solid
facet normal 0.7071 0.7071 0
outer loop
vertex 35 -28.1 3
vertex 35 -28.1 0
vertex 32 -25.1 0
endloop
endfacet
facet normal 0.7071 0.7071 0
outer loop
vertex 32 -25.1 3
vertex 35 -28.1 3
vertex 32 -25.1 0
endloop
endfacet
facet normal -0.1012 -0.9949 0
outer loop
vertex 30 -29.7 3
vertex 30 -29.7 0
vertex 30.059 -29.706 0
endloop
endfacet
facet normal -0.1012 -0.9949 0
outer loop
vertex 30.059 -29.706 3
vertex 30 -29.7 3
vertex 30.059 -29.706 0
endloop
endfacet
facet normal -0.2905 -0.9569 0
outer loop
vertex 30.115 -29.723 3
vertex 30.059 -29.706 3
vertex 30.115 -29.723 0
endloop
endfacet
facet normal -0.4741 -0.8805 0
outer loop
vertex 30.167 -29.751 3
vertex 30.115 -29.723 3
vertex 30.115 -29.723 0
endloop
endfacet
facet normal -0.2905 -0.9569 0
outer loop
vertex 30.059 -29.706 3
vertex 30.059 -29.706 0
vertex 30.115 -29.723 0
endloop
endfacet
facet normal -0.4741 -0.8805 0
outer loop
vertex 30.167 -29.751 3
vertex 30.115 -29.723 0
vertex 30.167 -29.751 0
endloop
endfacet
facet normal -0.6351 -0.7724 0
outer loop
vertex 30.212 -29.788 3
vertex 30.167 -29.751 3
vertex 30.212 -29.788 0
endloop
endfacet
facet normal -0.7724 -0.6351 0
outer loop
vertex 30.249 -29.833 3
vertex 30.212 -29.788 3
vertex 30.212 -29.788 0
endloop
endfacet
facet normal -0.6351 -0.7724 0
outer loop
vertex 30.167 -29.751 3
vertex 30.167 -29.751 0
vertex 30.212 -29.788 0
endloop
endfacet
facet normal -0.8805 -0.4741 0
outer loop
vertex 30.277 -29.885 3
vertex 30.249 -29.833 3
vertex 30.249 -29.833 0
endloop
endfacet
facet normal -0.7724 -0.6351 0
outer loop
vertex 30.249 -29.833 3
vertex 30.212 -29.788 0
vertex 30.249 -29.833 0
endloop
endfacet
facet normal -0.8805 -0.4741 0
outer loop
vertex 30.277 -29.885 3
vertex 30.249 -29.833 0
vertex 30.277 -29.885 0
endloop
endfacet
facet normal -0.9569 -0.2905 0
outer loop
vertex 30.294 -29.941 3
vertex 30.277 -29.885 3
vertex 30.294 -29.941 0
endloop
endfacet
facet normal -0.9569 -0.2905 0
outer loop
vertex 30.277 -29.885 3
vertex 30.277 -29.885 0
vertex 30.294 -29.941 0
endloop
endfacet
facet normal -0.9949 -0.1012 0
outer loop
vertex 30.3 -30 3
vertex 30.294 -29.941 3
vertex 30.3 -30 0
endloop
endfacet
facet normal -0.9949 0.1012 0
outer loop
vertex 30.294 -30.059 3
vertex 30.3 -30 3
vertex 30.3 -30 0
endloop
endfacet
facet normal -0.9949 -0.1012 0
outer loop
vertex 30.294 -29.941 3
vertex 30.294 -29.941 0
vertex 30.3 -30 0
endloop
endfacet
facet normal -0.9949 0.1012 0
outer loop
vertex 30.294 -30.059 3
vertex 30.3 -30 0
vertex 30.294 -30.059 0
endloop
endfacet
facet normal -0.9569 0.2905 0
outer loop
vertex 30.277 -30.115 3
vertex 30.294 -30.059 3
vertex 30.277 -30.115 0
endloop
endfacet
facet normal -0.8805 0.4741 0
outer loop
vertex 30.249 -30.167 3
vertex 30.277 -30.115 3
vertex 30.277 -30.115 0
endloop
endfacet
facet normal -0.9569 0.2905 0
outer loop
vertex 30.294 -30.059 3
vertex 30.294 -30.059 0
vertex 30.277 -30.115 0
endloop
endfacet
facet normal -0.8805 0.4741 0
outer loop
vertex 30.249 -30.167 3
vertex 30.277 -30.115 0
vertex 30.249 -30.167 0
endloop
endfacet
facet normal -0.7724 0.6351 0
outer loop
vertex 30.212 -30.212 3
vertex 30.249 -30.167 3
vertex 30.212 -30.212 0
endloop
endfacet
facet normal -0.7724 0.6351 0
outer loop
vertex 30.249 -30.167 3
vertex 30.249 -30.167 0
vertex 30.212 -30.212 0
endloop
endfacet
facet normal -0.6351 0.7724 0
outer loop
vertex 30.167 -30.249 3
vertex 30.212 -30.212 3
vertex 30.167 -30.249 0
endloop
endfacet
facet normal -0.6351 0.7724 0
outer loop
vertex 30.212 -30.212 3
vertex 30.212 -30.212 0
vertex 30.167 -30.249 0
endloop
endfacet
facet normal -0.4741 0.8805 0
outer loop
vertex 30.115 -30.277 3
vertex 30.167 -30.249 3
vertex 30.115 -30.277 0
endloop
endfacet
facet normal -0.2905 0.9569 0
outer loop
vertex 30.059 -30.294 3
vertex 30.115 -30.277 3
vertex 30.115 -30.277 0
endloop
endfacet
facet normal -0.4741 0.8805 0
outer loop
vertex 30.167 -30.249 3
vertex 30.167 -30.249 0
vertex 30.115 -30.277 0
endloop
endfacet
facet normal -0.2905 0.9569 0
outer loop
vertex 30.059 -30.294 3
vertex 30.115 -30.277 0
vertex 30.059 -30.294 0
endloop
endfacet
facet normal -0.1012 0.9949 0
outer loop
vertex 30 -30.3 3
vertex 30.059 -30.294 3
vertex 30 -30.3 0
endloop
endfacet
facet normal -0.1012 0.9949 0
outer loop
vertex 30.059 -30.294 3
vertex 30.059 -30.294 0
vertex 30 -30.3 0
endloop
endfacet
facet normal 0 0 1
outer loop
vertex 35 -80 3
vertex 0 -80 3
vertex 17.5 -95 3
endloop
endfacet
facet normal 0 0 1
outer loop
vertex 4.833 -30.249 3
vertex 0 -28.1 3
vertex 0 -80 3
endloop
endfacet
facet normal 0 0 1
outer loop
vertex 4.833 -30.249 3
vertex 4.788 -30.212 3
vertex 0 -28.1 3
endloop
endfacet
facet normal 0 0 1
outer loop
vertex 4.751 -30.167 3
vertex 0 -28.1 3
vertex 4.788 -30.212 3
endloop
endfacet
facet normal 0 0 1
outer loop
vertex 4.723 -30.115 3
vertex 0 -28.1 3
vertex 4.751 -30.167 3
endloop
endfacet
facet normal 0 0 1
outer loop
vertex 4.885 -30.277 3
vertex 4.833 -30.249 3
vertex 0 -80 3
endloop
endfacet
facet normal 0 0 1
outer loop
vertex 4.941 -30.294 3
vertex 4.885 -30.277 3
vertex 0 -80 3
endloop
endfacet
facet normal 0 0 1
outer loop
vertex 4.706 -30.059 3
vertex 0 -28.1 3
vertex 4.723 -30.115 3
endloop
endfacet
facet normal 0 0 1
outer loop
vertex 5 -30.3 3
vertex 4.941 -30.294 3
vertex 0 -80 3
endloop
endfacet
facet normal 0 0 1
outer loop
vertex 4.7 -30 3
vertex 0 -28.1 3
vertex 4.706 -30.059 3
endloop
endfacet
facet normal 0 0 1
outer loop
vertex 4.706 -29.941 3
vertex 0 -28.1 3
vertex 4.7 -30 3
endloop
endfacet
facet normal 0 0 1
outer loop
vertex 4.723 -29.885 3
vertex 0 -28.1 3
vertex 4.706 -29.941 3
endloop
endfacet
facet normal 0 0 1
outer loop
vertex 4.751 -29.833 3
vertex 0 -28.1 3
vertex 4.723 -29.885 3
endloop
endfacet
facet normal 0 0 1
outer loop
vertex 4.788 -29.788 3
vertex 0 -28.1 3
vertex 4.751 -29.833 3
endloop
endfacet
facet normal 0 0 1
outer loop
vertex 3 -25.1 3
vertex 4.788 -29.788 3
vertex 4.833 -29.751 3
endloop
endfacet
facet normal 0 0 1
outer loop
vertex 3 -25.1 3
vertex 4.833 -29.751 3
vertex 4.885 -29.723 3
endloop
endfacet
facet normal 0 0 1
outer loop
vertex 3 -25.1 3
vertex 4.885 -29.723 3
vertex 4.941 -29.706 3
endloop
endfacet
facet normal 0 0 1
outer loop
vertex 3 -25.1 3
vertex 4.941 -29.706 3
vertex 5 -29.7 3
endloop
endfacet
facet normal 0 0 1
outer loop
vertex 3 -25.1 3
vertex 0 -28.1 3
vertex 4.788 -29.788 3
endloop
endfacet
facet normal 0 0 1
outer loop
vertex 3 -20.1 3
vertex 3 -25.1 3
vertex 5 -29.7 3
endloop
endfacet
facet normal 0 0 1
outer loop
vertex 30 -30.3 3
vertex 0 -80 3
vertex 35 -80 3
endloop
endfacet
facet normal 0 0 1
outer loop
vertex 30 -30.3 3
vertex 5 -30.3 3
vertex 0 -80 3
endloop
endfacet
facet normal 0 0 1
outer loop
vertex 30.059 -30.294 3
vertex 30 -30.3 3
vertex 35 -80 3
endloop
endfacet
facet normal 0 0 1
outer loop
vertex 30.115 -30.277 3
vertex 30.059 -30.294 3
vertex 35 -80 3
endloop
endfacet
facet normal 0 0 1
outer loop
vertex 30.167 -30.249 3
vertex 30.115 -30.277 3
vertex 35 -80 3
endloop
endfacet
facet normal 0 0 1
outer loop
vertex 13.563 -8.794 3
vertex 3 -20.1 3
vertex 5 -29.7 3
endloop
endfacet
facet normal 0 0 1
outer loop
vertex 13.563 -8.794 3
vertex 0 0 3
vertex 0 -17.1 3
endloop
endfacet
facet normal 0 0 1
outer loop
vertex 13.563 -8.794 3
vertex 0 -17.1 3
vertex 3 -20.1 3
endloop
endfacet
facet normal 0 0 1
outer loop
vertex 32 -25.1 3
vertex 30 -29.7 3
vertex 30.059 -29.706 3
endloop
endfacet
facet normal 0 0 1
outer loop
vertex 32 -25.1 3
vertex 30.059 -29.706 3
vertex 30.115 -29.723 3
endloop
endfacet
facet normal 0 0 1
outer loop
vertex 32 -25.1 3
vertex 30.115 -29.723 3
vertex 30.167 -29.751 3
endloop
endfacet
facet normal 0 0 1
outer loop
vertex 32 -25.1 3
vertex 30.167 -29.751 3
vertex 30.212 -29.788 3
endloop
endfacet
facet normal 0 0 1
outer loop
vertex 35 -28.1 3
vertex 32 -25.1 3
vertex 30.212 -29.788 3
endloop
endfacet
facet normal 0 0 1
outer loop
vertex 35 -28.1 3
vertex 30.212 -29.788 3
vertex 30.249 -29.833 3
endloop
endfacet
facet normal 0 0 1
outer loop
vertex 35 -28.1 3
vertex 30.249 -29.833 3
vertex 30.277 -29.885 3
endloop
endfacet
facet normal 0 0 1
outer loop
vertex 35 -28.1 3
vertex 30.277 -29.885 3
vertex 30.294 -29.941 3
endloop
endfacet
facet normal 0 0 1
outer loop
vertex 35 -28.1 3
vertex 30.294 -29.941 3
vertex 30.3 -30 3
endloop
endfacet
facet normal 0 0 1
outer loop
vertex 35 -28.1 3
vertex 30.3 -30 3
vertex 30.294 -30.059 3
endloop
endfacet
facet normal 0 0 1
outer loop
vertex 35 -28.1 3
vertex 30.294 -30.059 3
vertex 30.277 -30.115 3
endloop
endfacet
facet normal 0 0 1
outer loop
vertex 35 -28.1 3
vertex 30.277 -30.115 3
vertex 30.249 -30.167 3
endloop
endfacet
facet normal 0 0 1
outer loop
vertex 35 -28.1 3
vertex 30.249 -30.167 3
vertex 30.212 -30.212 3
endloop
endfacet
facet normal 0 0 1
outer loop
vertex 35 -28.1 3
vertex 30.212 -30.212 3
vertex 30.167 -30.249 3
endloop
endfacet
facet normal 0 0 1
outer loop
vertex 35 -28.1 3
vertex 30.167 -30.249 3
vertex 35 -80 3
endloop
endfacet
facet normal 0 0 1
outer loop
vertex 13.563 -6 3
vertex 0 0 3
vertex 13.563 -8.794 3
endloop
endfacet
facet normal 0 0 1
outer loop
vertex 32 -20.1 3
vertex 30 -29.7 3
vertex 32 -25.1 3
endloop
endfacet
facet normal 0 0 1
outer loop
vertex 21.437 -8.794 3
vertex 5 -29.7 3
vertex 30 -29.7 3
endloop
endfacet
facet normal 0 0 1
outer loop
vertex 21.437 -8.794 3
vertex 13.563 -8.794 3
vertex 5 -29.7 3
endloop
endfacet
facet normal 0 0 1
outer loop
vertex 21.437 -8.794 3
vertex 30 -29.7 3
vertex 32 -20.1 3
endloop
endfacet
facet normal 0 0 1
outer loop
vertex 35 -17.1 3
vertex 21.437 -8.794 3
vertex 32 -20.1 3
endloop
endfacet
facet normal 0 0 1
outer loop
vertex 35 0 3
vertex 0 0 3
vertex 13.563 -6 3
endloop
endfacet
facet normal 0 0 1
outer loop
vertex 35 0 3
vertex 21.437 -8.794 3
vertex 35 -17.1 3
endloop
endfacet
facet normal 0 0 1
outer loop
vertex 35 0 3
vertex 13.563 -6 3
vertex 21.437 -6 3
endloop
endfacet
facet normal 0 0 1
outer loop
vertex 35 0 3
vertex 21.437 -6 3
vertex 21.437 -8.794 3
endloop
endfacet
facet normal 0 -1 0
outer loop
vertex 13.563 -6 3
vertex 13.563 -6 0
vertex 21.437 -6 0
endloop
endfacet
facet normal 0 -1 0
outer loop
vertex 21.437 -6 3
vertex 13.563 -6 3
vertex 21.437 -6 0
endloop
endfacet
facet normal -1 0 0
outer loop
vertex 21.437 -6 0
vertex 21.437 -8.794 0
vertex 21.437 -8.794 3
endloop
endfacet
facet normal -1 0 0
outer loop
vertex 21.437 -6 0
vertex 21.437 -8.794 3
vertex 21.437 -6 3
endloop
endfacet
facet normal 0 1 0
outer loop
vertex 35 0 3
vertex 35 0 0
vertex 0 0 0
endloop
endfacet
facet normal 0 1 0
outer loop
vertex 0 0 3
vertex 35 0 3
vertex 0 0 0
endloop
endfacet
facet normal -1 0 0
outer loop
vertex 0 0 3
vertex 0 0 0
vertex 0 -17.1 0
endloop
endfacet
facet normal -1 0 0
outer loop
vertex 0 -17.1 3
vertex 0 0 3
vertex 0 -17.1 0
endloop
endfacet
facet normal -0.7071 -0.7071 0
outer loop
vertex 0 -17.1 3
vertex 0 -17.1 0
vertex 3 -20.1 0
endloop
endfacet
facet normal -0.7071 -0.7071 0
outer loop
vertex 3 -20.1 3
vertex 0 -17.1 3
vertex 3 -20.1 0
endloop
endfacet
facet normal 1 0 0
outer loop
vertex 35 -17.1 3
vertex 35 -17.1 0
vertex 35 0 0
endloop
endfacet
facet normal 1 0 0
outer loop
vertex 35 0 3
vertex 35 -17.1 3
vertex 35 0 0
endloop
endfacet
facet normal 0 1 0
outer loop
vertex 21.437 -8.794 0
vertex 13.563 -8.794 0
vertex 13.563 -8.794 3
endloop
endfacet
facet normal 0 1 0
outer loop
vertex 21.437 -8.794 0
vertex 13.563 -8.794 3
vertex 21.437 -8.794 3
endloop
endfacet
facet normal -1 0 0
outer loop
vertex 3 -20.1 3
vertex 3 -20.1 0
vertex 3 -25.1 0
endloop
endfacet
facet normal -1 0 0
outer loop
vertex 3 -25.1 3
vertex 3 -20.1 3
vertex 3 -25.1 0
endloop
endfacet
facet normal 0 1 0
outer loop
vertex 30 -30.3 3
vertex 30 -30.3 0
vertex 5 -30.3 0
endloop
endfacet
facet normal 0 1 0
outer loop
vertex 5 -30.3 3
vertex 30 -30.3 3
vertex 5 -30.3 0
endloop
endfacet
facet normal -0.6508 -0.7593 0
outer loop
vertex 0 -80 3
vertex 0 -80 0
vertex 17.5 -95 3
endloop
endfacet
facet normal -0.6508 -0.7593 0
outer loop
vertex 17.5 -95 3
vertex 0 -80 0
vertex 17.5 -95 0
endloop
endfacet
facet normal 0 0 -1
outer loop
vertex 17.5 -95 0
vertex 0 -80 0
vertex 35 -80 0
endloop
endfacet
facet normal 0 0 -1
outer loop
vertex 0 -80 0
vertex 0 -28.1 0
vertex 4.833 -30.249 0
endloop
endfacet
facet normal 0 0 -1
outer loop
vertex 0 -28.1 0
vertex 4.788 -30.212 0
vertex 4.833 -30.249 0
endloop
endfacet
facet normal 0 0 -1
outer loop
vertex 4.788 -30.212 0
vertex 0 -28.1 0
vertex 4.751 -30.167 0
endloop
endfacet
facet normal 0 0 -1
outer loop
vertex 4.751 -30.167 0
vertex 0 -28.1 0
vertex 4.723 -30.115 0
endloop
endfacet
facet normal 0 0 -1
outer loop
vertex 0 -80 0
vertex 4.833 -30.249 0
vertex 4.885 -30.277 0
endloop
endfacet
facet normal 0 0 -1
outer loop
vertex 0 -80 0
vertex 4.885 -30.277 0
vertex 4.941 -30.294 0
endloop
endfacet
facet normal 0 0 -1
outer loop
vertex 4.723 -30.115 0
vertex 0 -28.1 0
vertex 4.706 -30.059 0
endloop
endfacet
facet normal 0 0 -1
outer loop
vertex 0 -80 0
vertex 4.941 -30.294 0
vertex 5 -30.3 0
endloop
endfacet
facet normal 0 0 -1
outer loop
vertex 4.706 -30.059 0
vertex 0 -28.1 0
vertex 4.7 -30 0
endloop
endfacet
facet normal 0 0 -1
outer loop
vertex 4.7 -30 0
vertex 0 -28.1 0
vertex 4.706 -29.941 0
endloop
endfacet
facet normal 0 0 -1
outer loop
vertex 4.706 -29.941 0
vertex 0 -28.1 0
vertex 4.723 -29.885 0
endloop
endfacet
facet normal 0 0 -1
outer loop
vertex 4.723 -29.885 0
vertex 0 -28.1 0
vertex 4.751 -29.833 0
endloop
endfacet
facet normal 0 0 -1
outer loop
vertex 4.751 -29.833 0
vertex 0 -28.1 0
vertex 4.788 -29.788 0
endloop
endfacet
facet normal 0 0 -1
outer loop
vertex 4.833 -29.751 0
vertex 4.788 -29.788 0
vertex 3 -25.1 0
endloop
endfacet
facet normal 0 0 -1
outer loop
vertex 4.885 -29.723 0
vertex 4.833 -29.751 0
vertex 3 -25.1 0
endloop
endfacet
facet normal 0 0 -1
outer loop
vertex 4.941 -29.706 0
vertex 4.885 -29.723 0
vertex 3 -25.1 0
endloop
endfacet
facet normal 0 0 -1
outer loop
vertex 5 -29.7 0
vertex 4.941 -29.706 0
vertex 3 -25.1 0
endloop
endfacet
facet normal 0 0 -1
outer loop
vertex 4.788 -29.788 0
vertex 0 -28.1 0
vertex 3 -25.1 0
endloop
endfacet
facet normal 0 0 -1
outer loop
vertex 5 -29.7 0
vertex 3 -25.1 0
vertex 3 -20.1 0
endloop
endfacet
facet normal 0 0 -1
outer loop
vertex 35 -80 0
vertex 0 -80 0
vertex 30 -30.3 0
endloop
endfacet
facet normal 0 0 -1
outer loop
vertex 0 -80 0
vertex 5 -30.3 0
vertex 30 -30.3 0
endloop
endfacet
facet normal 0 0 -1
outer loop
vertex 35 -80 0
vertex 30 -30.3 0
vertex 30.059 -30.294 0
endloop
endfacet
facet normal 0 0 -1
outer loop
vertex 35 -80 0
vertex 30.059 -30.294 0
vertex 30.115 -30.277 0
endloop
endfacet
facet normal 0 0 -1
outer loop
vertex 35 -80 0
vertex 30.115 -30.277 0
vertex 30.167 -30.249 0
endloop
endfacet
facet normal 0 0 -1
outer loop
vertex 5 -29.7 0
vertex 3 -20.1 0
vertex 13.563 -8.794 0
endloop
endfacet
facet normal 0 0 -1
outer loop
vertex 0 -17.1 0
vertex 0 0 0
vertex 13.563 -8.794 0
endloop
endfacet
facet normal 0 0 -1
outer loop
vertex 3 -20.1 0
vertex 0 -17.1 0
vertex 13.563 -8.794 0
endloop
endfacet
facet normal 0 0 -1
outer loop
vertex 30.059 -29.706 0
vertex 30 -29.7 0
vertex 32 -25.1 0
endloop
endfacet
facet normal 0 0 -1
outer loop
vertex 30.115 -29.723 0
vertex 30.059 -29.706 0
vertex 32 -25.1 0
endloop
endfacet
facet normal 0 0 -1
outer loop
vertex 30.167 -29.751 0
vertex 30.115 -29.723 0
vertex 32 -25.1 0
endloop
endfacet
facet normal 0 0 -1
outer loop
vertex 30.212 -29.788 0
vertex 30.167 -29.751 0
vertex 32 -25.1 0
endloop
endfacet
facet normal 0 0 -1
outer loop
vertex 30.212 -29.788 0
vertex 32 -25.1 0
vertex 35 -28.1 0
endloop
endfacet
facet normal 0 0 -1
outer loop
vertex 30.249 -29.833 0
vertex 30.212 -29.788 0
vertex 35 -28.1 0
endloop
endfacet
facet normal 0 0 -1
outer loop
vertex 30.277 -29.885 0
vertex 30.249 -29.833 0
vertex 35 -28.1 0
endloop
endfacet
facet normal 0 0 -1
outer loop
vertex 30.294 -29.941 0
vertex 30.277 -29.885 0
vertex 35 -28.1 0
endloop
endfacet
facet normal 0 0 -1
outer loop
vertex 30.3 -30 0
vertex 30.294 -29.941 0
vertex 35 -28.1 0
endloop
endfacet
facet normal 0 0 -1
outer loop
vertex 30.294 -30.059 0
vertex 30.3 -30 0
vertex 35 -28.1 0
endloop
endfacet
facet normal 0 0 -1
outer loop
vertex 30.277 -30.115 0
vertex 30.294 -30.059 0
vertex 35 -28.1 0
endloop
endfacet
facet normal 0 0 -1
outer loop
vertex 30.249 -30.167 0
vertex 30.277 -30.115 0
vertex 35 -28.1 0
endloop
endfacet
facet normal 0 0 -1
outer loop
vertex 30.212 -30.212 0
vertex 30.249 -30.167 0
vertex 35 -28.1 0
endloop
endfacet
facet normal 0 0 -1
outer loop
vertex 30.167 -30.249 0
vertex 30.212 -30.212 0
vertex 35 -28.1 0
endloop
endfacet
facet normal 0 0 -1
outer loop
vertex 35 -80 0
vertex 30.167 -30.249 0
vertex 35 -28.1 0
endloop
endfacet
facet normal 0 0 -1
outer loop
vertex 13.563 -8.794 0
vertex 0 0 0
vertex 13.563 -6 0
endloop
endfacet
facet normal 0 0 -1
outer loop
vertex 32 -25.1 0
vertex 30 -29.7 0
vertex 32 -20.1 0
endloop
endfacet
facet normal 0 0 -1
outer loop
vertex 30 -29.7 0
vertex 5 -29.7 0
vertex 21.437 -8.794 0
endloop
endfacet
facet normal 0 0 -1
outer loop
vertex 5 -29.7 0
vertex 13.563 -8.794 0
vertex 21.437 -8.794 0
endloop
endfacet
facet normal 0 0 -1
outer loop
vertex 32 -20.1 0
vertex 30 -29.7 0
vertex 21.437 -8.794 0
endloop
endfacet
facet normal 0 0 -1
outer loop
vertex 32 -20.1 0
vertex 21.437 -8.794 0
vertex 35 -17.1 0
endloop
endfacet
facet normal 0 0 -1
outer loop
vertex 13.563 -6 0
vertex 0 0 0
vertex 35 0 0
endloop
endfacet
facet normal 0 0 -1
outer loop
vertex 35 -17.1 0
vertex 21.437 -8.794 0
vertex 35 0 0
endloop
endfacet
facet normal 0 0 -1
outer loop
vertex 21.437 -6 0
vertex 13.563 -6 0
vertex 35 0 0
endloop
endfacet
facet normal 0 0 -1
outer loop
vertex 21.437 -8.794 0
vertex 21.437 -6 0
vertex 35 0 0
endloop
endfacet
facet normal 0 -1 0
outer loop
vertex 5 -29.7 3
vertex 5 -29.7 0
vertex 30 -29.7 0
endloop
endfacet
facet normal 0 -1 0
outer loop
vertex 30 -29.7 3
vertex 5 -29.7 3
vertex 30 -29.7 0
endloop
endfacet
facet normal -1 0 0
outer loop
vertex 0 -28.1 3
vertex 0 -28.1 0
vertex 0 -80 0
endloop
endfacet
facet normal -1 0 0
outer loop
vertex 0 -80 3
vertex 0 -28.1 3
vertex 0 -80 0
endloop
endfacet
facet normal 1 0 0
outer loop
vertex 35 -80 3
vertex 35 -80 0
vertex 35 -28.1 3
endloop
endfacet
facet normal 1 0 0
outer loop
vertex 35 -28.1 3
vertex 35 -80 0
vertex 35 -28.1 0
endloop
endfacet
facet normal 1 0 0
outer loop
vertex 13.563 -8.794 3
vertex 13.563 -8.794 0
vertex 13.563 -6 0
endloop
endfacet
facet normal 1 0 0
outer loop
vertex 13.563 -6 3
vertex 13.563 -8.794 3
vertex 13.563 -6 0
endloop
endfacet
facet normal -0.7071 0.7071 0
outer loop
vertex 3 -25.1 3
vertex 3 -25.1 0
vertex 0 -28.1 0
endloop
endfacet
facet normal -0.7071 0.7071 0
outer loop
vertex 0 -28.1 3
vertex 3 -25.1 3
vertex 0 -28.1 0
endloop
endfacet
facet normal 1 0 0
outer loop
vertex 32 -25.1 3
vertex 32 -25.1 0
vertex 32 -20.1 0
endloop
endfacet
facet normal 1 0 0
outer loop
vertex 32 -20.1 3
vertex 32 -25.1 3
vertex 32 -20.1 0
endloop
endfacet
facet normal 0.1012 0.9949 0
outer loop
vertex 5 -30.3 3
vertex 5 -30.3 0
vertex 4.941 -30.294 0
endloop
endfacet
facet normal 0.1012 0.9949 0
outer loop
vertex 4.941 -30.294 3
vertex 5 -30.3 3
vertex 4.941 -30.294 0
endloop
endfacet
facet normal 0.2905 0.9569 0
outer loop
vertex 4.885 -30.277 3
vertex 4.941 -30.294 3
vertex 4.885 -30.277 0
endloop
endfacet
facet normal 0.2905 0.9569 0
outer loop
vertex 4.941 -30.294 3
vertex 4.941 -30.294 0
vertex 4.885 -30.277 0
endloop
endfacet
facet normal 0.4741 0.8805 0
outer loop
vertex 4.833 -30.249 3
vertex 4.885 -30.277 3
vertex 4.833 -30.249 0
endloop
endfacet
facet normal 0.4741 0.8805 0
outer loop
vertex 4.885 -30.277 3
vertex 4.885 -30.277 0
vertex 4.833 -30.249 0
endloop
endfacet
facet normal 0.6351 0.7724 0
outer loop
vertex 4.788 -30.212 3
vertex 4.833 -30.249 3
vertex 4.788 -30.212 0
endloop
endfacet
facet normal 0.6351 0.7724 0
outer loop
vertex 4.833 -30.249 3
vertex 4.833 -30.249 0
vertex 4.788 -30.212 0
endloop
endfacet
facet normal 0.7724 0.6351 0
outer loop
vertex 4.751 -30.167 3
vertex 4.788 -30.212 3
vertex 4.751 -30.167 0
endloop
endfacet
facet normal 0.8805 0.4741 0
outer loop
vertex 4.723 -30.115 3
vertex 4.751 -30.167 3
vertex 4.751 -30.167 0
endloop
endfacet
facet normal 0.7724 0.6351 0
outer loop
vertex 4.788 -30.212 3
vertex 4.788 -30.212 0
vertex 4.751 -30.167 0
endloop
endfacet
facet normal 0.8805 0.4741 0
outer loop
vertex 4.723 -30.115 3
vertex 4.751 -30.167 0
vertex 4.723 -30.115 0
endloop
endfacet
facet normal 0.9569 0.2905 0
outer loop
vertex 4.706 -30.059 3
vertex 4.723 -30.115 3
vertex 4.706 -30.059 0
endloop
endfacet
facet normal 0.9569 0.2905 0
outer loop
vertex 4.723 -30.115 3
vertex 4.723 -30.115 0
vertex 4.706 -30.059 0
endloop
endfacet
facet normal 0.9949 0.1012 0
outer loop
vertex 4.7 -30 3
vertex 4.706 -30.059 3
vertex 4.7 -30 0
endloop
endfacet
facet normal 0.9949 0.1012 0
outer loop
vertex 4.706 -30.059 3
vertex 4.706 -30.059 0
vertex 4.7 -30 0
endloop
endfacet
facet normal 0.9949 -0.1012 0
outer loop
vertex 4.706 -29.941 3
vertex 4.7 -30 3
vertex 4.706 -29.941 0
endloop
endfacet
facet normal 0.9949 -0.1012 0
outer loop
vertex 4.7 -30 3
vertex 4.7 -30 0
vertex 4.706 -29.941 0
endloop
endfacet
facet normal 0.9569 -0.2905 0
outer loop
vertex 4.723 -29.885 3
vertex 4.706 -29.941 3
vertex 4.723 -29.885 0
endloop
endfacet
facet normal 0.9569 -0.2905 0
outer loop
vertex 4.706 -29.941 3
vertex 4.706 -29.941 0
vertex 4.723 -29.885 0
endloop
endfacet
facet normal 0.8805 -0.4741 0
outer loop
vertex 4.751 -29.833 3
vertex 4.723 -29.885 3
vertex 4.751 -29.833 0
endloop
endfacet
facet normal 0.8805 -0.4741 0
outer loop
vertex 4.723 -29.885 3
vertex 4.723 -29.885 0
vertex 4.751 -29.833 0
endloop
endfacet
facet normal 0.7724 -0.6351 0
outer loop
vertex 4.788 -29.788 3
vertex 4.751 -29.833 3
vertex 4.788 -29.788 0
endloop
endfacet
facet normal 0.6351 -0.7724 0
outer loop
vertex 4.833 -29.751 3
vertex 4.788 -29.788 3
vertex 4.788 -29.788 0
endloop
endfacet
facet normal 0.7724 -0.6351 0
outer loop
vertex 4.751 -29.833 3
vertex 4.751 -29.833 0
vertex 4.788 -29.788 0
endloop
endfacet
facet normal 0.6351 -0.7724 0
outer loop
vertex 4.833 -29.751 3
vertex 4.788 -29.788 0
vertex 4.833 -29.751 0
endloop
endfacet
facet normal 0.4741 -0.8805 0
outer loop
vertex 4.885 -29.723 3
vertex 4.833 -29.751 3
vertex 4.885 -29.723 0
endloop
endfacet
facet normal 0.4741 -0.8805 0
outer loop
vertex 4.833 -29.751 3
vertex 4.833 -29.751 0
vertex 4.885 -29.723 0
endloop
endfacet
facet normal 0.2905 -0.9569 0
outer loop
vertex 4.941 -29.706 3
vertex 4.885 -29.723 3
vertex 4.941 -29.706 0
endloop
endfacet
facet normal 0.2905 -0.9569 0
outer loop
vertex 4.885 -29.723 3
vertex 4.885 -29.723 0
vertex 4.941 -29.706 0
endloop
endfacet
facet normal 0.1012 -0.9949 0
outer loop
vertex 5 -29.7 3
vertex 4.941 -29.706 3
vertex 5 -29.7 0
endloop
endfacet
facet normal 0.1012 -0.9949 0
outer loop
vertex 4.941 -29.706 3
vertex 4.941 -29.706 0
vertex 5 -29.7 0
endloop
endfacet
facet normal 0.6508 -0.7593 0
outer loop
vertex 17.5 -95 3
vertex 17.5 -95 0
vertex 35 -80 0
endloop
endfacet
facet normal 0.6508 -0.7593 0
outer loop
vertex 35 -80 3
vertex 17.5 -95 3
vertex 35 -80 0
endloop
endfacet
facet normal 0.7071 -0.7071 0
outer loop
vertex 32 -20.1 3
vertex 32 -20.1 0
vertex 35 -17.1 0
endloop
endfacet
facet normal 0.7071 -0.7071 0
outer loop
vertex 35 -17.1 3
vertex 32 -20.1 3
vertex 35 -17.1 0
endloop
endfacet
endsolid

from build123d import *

# Parameters (mm, degrees)
ESBO_O1_W                = 7.874
ESBO_O1_H                = 2.794
RESSALTO_EXTRUS_O1_DEPTH = 3


with BuildPart() as part:
    # Esboço1 → Ressalto-extrusão1 (new body)
    with BuildSketch(Plane.XY):
        Polygon((17.5, -95), (35, -80), (35, -28.1), (32, -25.1), (32, -20.1), (35, -17.1), (35, 0), (0, 0), (0, -17.1), (3, -20.1), (3, -25.1), (0, -28.1), (0, -80), align=None)
        with BuildLine():
            ThreePointArc((5, -30.3), (4.7, -30), (5, -29.7))
            Line((5, -29.7), (30, -29.7))
            ThreePointArc((30, -29.7), (30.3, -30), (30, -30.3))
            Line((30, -30.3), (5, -30.3))
        make_face(mode=Mode.SUBTRACT)
        with Locations((17.5, -7.397)):
            Rectangle(ESBO_O1_W, ESBO_O1_H, mode=Mode.SUBTRACT)
    extrude(amount=RESSALTO_EXTRUS_O1_DEPTH)


solid = part.part
